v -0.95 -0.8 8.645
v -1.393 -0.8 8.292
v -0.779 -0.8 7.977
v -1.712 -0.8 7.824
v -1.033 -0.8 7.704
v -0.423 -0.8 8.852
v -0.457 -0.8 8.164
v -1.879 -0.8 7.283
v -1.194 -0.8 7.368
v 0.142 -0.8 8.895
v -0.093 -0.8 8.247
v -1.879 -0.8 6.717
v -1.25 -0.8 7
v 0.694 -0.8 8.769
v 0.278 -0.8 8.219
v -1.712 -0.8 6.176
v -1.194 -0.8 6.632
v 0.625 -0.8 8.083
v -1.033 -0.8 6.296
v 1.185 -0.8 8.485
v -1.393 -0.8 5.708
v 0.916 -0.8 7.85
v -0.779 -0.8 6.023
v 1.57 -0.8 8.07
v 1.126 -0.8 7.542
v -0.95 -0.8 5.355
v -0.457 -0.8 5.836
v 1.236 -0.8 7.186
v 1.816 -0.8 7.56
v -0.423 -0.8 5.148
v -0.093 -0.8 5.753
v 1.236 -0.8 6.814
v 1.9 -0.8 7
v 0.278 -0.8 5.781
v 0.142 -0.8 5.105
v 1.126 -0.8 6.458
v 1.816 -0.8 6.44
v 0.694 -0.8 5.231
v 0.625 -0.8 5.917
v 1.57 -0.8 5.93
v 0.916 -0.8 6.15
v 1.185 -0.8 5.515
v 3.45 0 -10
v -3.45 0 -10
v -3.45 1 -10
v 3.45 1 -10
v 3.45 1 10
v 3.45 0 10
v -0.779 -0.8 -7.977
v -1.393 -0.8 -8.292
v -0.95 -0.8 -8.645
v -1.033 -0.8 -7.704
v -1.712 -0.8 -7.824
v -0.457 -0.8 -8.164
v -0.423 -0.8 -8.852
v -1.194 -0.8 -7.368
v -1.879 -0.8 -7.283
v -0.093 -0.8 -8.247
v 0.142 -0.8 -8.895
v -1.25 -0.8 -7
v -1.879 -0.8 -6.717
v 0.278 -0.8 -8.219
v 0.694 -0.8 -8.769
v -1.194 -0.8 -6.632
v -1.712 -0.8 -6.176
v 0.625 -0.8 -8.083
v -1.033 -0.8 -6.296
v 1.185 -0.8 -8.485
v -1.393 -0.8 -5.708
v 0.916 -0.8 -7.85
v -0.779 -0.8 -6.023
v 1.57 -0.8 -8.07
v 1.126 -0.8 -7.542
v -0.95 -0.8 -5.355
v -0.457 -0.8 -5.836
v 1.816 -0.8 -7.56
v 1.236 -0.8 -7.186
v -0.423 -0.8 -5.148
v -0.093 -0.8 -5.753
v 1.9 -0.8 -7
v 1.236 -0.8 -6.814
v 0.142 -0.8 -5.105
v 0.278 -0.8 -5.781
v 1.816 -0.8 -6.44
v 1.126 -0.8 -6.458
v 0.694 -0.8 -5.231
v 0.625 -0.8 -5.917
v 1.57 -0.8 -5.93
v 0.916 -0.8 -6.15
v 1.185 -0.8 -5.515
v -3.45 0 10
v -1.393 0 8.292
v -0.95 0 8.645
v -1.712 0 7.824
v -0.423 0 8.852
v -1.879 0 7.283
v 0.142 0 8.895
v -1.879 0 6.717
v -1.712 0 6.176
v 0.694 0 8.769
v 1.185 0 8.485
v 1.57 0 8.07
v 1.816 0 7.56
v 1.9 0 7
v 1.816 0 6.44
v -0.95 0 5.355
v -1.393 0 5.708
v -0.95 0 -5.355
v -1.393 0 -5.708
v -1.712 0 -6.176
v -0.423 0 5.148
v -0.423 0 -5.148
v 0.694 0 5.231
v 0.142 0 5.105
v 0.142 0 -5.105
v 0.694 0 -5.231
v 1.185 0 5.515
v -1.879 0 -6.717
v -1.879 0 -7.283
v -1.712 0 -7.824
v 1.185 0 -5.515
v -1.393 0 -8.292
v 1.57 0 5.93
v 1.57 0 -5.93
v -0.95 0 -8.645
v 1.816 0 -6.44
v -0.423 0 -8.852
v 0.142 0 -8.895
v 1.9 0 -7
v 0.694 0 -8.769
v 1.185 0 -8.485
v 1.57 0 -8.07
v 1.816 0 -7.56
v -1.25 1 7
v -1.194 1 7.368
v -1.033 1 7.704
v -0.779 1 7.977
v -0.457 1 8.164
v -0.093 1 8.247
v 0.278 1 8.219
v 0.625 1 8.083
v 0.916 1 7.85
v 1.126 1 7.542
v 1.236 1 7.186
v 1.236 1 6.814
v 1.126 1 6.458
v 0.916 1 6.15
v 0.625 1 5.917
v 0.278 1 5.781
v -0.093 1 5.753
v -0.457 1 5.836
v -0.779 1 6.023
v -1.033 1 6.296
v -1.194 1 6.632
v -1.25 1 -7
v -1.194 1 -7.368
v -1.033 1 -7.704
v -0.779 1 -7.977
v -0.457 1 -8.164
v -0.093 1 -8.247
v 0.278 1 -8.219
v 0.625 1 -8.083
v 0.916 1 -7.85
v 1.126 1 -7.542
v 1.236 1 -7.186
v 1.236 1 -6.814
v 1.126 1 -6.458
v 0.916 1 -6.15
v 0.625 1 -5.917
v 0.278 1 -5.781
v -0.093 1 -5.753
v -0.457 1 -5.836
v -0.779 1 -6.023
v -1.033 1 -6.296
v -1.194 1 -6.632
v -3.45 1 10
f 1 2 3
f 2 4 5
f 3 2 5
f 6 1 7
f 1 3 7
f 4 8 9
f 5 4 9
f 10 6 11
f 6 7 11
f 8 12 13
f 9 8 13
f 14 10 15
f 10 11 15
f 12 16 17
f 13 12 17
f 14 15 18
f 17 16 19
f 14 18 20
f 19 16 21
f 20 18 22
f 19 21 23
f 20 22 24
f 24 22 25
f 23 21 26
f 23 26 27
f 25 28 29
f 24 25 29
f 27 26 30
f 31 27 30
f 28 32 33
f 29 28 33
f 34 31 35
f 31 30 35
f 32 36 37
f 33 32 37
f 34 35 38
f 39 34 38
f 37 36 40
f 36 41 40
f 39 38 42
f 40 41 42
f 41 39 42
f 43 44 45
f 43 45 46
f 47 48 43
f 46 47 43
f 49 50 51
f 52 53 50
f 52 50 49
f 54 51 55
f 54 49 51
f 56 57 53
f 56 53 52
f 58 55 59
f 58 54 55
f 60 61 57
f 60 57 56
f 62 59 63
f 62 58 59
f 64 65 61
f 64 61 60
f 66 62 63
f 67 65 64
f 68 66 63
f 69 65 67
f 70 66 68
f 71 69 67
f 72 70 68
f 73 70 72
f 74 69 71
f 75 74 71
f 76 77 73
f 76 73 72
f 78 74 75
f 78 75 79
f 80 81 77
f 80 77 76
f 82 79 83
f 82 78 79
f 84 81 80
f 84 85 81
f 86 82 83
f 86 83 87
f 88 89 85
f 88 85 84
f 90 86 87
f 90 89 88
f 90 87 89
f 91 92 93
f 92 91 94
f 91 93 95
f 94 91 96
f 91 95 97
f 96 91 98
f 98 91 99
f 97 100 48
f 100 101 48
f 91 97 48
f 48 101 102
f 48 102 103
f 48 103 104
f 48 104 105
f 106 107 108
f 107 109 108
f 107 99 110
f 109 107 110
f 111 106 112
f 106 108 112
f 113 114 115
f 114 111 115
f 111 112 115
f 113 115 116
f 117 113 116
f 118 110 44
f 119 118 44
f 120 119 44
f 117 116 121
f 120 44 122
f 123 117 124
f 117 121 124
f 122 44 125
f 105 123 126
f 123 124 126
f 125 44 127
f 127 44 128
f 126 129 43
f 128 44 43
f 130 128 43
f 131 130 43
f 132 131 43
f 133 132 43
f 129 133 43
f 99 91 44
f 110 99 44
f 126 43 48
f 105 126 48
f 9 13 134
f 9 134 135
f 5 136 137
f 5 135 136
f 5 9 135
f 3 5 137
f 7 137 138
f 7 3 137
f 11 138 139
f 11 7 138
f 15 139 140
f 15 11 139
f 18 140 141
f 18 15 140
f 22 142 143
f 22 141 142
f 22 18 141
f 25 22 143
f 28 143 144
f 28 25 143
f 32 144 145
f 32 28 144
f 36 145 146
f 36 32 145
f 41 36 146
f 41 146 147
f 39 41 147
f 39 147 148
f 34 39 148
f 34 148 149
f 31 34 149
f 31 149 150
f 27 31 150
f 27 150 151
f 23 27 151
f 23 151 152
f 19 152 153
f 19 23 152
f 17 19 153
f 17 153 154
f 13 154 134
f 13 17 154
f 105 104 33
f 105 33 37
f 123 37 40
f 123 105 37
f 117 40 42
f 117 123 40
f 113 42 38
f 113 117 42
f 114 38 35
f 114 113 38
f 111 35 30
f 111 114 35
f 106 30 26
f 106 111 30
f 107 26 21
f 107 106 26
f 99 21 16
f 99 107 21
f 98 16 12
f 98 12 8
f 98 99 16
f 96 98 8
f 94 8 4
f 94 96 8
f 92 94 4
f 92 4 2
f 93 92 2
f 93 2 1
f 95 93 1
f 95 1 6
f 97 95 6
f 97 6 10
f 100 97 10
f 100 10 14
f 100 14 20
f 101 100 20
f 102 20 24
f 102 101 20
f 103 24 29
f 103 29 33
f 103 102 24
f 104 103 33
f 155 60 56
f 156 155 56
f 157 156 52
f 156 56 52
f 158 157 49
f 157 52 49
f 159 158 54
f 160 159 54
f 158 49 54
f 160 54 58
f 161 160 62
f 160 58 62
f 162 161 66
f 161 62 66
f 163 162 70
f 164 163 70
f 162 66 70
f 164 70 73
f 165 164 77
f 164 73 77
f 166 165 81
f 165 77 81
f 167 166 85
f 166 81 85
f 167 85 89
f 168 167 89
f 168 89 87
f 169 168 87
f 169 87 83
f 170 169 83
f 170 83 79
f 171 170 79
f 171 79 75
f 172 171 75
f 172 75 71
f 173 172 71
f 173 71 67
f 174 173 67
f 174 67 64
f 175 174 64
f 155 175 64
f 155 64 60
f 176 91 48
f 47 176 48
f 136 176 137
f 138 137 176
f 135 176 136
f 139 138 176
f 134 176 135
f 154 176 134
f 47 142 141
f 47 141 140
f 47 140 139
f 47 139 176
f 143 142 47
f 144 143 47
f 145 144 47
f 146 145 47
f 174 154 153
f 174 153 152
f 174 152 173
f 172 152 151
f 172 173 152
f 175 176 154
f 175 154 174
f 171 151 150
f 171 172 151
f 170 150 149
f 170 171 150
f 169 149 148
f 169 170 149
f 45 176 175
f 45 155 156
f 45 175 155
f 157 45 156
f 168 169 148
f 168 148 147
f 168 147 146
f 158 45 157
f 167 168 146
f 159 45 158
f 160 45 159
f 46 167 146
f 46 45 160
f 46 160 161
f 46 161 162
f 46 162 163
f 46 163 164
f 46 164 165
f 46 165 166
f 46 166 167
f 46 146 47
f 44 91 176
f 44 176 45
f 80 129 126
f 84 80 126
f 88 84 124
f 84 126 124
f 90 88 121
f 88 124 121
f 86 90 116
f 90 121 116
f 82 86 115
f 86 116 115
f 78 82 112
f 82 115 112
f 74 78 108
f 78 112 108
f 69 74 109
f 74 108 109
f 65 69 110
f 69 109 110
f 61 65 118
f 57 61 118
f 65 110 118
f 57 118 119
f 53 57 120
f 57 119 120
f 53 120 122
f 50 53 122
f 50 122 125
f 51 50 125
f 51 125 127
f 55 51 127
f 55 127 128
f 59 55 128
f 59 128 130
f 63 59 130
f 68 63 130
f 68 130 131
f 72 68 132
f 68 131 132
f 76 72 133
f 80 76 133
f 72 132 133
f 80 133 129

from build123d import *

# Parameters (mm, degrees)
SKETCH1_W             = 6.9
SKETCH1_H             = 20
BOSS_EXTRUDE1_DEPTH   = 1
SKETCH4_R             = 1.9
BOSS_EXTRUDE2_DEPTH   = 0.8
M3X0_5_TAPPED_HOLE1_D = 2.5


with BuildPart() as part:
    # Sketch1 → Boss-Extrude1 (new body)
    with BuildSketch(Plane(origin=(0, 0, 0), x_dir=(1, 0, 0), z_dir=(0, 1, 0))):
        Rectangle(SKETCH1_W, SKETCH1_H)
    extrude(amount=BOSS_EXTRUDE1_DEPTH)

    # Sketch4 → Boss-Extrude2 (add)
    with BuildSketch(Plane.XZ):
        with Locations((0, -7)):
            Circle(SKETCH4_R)
    boss_extrude2 = extrude(amount=BOSS_EXTRUDE2_DEPTH)

    # Mirror2: Boss-Extrude2 across plane
    add(boss_extrude2.mirror(Plane.XY))

    # M3x0.5 Tapped Hole1 (through all)
    with Locations(Plane(origin=(0, 1, 0), x_dir=(1, 0, 0), z_dir=(0, 1, 0))):
        with Locations((0, 7)):
            m3x0_5_tapped_hole1 = Hole(M3X0_5_TAPPED_HOLE1_D / 2)

    # Mirror1: M3x0.5 Tapped Hole1 across plane
    add(m3x0_5_tapped_hole1.mirror(Plane.XY), mode=Mode.SUBTRACT)


solid = part.part
